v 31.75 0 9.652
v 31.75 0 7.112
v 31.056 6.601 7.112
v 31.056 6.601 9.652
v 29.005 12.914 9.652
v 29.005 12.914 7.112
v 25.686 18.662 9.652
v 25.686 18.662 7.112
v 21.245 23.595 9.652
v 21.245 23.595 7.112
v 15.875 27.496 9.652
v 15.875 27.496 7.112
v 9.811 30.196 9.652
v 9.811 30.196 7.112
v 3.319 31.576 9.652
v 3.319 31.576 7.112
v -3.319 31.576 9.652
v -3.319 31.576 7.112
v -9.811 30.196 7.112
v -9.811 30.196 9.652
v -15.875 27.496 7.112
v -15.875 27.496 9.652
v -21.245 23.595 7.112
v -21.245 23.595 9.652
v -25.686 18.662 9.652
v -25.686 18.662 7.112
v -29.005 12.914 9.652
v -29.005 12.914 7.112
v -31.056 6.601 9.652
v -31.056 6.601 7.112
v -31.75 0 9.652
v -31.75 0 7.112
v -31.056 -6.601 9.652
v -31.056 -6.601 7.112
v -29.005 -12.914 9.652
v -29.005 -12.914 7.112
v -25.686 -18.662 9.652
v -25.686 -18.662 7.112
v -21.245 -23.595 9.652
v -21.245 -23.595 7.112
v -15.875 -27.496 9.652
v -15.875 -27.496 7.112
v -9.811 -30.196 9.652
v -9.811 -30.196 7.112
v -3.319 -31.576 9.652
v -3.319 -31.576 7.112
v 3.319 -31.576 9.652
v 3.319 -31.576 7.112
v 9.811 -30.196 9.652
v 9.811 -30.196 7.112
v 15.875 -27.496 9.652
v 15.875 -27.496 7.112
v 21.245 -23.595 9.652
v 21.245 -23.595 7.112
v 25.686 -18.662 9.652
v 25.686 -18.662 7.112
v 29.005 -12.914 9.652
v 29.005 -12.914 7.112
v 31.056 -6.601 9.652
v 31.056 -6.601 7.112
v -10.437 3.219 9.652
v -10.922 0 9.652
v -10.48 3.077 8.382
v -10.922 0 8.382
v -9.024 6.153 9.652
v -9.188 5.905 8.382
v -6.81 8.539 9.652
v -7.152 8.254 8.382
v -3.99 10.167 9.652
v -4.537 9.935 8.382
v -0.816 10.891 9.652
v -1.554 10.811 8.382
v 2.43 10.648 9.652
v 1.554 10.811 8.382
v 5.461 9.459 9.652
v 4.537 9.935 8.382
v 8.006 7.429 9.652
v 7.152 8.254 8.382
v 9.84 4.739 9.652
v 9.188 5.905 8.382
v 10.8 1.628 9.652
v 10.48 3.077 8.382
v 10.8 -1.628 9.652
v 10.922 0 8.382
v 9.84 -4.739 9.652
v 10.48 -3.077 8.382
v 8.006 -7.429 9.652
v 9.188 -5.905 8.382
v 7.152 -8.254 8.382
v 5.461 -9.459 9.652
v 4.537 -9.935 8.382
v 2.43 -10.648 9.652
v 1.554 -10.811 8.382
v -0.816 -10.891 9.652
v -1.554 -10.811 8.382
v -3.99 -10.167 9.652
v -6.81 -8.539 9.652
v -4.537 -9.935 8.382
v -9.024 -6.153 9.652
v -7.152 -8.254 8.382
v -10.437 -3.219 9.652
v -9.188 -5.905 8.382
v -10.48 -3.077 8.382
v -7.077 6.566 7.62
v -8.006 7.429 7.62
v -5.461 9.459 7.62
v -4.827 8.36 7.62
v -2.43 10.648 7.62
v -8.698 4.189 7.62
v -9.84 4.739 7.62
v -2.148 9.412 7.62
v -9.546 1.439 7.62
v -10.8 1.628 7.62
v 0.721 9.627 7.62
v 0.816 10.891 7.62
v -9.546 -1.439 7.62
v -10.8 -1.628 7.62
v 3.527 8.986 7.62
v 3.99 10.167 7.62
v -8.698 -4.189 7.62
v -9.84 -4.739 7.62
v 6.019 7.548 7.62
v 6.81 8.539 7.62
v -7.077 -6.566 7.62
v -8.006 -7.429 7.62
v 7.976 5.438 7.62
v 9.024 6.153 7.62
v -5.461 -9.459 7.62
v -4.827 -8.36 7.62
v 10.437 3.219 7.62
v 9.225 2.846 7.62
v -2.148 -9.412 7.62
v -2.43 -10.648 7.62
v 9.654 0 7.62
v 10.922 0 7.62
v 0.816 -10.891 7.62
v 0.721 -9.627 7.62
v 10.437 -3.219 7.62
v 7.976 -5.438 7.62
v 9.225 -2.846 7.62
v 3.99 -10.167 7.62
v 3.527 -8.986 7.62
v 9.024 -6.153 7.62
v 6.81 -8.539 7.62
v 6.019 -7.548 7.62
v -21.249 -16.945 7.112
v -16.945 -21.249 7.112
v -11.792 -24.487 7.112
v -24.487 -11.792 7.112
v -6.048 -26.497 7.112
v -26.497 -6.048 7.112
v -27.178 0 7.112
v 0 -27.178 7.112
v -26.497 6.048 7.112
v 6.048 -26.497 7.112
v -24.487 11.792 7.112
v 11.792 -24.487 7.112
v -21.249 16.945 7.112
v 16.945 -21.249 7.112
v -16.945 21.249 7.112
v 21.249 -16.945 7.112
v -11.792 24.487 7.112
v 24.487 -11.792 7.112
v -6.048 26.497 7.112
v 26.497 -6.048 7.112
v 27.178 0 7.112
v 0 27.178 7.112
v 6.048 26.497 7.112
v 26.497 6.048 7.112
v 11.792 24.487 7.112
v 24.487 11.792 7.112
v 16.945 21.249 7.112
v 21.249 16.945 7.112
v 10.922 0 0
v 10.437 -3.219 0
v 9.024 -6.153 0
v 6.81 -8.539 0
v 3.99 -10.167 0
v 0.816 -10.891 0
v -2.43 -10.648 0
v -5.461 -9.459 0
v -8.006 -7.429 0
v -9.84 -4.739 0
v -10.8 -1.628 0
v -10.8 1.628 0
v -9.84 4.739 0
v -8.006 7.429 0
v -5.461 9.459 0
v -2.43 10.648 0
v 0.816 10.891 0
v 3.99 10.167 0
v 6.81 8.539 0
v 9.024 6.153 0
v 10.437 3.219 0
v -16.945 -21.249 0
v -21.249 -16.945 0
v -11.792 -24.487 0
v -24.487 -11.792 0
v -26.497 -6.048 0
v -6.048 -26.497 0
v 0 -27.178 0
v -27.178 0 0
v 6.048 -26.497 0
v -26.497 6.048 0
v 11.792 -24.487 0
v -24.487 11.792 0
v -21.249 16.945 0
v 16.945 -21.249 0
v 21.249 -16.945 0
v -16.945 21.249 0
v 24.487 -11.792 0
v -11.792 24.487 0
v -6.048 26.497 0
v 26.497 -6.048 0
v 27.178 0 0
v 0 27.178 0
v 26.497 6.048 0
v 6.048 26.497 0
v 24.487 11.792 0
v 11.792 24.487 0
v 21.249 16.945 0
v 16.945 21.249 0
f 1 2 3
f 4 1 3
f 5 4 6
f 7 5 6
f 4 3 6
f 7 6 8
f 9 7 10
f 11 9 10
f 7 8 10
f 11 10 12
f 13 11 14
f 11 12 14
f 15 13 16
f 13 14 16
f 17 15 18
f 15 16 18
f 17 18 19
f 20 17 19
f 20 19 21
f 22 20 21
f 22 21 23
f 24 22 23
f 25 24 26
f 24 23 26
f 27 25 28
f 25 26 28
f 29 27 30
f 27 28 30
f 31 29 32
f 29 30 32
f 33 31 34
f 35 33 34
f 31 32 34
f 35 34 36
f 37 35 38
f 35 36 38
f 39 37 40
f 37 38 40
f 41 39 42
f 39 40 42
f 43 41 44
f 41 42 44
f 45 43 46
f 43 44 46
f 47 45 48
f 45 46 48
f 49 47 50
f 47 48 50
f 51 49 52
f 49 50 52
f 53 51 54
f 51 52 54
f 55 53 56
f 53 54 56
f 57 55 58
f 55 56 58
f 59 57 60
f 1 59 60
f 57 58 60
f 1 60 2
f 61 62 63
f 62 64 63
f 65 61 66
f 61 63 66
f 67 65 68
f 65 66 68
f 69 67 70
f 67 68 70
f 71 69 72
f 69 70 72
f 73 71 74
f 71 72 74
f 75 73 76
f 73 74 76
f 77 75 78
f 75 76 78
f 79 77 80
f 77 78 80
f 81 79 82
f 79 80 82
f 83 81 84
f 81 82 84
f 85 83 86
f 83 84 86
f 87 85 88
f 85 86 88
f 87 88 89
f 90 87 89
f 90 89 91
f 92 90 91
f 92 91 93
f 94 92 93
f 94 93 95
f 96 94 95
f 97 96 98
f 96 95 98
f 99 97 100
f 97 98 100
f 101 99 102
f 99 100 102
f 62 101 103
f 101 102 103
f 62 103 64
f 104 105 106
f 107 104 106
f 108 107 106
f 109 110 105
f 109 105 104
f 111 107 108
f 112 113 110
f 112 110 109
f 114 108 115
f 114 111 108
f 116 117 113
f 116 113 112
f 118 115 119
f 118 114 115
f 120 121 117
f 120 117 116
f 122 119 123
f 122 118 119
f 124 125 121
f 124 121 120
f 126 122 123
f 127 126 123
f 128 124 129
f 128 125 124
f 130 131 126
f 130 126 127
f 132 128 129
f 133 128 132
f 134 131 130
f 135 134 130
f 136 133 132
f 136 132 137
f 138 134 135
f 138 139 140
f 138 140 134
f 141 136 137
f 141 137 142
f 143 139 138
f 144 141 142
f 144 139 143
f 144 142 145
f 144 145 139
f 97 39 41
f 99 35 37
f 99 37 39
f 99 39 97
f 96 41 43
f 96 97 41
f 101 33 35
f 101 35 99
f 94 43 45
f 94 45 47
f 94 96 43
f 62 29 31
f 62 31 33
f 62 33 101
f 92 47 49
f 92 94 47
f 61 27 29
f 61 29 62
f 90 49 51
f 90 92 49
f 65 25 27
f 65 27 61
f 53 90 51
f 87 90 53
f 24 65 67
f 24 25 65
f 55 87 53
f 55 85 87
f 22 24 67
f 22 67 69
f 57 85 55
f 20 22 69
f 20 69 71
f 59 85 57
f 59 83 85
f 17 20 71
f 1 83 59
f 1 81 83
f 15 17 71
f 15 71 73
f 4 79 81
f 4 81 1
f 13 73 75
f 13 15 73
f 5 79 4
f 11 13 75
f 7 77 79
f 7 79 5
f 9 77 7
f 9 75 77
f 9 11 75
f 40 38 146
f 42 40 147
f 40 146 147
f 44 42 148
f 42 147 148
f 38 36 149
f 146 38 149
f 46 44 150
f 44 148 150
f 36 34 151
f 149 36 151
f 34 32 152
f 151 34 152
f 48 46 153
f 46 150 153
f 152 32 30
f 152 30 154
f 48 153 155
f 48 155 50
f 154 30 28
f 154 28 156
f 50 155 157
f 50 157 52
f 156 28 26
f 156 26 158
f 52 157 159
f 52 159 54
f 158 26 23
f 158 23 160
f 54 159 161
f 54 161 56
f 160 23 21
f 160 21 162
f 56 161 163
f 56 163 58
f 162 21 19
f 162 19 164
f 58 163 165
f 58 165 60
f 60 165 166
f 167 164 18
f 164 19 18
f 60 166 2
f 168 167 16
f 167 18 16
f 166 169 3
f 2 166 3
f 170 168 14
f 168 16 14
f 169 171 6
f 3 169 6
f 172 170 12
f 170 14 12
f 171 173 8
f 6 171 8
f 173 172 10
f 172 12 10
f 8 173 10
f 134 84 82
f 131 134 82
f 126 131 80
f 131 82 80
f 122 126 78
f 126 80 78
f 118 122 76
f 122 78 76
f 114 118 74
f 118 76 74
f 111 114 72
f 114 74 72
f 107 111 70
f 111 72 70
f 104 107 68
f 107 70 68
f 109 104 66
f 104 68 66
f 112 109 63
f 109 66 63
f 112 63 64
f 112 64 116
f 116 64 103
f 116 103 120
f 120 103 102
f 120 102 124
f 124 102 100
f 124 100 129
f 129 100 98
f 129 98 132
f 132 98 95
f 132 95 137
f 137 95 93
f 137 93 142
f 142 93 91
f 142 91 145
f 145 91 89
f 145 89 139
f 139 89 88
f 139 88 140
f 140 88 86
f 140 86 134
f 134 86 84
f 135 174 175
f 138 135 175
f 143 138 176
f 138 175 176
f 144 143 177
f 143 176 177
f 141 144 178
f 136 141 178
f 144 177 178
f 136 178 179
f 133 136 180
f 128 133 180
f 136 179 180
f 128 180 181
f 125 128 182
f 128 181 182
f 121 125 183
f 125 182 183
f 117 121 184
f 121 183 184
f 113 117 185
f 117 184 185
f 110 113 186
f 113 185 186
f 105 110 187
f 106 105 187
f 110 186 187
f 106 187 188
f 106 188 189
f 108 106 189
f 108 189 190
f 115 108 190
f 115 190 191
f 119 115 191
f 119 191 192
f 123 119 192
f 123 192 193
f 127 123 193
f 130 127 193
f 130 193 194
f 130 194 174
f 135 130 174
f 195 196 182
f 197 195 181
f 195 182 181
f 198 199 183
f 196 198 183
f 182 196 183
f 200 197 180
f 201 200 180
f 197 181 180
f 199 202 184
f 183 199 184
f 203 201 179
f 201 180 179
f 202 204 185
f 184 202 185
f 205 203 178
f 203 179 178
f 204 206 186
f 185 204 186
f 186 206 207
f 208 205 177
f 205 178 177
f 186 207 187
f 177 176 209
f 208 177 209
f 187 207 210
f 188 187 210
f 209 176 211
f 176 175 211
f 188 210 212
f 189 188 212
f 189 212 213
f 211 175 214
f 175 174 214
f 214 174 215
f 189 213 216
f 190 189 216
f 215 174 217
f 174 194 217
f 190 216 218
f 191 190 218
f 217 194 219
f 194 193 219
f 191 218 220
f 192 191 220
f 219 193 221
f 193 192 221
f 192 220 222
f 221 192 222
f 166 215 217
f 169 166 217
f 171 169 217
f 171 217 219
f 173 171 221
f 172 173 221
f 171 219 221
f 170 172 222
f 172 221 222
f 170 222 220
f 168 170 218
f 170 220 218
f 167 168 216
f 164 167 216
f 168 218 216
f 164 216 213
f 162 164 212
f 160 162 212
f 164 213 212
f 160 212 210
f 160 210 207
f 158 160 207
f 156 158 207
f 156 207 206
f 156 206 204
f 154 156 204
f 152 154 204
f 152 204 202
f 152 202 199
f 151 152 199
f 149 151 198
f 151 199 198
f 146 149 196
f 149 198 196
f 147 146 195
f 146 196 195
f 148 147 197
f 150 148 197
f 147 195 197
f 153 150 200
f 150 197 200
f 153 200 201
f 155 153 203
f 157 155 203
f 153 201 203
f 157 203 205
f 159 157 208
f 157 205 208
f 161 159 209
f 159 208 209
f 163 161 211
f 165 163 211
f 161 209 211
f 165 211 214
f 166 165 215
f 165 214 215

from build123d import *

# Parameters (mm, degrees)
F0_R           = 27.178
F1_DEPTH       = 7.112
F2_R           = 31.75
F3_DEPTH       = 2.54
F5_D           = 19.304
F5_DEPTH       = 7.62
F5_CBORE_D     = 21.844
F5_CBORE_DEPTH = 7.62
F5_TIP         = 5.7995066949
F7_D           = 21.844
F7_DEPTH       = 1.27
F7_TIP         = 6.562599681


with BuildPart() as f1:
    # F0 (on Top) → F1 (new body)
    with BuildSketch(Plane.XY):
        Circle(F0_R)
    extrude(amount=F1_DEPTH)

    # F2 (on face) → F3 (join)
    with BuildSketch(Plane.XY.offset(7.112)):
        Circle(F2_R)
    extrude(amount=F3_DEPTH)

    # F5
    with Locations(Plane(origin=(0, 0, 0), x_dir=(1, 0, 0), z_dir=(0, 0, -1))):
        with Locations((0, 0)):
            CounterBoreHole(F5_D / 2, F5_CBORE_D / 2, F5_CBORE_DEPTH, depth=F5_DEPTH)
            with Locations((0, 0, -(F5_DEPTH + F5_TIP / 2))):  # 118° drill point
                Cone(0, F5_D / 2, F5_TIP, mode=Mode.SUBTRACT)

    # F7
    with Locations(Plane.XY.offset(9.652)):
        with Locations((0, 0)):
            Hole(F7_D / 2, depth=F7_DEPTH)
            with Locations((0, 0, -(F7_DEPTH + F7_TIP / 2))):  # 118° drill point
                Cone(0, F7_D / 2, F7_TIP, mode=Mode.SUBTRACT)


solid = f1.part
